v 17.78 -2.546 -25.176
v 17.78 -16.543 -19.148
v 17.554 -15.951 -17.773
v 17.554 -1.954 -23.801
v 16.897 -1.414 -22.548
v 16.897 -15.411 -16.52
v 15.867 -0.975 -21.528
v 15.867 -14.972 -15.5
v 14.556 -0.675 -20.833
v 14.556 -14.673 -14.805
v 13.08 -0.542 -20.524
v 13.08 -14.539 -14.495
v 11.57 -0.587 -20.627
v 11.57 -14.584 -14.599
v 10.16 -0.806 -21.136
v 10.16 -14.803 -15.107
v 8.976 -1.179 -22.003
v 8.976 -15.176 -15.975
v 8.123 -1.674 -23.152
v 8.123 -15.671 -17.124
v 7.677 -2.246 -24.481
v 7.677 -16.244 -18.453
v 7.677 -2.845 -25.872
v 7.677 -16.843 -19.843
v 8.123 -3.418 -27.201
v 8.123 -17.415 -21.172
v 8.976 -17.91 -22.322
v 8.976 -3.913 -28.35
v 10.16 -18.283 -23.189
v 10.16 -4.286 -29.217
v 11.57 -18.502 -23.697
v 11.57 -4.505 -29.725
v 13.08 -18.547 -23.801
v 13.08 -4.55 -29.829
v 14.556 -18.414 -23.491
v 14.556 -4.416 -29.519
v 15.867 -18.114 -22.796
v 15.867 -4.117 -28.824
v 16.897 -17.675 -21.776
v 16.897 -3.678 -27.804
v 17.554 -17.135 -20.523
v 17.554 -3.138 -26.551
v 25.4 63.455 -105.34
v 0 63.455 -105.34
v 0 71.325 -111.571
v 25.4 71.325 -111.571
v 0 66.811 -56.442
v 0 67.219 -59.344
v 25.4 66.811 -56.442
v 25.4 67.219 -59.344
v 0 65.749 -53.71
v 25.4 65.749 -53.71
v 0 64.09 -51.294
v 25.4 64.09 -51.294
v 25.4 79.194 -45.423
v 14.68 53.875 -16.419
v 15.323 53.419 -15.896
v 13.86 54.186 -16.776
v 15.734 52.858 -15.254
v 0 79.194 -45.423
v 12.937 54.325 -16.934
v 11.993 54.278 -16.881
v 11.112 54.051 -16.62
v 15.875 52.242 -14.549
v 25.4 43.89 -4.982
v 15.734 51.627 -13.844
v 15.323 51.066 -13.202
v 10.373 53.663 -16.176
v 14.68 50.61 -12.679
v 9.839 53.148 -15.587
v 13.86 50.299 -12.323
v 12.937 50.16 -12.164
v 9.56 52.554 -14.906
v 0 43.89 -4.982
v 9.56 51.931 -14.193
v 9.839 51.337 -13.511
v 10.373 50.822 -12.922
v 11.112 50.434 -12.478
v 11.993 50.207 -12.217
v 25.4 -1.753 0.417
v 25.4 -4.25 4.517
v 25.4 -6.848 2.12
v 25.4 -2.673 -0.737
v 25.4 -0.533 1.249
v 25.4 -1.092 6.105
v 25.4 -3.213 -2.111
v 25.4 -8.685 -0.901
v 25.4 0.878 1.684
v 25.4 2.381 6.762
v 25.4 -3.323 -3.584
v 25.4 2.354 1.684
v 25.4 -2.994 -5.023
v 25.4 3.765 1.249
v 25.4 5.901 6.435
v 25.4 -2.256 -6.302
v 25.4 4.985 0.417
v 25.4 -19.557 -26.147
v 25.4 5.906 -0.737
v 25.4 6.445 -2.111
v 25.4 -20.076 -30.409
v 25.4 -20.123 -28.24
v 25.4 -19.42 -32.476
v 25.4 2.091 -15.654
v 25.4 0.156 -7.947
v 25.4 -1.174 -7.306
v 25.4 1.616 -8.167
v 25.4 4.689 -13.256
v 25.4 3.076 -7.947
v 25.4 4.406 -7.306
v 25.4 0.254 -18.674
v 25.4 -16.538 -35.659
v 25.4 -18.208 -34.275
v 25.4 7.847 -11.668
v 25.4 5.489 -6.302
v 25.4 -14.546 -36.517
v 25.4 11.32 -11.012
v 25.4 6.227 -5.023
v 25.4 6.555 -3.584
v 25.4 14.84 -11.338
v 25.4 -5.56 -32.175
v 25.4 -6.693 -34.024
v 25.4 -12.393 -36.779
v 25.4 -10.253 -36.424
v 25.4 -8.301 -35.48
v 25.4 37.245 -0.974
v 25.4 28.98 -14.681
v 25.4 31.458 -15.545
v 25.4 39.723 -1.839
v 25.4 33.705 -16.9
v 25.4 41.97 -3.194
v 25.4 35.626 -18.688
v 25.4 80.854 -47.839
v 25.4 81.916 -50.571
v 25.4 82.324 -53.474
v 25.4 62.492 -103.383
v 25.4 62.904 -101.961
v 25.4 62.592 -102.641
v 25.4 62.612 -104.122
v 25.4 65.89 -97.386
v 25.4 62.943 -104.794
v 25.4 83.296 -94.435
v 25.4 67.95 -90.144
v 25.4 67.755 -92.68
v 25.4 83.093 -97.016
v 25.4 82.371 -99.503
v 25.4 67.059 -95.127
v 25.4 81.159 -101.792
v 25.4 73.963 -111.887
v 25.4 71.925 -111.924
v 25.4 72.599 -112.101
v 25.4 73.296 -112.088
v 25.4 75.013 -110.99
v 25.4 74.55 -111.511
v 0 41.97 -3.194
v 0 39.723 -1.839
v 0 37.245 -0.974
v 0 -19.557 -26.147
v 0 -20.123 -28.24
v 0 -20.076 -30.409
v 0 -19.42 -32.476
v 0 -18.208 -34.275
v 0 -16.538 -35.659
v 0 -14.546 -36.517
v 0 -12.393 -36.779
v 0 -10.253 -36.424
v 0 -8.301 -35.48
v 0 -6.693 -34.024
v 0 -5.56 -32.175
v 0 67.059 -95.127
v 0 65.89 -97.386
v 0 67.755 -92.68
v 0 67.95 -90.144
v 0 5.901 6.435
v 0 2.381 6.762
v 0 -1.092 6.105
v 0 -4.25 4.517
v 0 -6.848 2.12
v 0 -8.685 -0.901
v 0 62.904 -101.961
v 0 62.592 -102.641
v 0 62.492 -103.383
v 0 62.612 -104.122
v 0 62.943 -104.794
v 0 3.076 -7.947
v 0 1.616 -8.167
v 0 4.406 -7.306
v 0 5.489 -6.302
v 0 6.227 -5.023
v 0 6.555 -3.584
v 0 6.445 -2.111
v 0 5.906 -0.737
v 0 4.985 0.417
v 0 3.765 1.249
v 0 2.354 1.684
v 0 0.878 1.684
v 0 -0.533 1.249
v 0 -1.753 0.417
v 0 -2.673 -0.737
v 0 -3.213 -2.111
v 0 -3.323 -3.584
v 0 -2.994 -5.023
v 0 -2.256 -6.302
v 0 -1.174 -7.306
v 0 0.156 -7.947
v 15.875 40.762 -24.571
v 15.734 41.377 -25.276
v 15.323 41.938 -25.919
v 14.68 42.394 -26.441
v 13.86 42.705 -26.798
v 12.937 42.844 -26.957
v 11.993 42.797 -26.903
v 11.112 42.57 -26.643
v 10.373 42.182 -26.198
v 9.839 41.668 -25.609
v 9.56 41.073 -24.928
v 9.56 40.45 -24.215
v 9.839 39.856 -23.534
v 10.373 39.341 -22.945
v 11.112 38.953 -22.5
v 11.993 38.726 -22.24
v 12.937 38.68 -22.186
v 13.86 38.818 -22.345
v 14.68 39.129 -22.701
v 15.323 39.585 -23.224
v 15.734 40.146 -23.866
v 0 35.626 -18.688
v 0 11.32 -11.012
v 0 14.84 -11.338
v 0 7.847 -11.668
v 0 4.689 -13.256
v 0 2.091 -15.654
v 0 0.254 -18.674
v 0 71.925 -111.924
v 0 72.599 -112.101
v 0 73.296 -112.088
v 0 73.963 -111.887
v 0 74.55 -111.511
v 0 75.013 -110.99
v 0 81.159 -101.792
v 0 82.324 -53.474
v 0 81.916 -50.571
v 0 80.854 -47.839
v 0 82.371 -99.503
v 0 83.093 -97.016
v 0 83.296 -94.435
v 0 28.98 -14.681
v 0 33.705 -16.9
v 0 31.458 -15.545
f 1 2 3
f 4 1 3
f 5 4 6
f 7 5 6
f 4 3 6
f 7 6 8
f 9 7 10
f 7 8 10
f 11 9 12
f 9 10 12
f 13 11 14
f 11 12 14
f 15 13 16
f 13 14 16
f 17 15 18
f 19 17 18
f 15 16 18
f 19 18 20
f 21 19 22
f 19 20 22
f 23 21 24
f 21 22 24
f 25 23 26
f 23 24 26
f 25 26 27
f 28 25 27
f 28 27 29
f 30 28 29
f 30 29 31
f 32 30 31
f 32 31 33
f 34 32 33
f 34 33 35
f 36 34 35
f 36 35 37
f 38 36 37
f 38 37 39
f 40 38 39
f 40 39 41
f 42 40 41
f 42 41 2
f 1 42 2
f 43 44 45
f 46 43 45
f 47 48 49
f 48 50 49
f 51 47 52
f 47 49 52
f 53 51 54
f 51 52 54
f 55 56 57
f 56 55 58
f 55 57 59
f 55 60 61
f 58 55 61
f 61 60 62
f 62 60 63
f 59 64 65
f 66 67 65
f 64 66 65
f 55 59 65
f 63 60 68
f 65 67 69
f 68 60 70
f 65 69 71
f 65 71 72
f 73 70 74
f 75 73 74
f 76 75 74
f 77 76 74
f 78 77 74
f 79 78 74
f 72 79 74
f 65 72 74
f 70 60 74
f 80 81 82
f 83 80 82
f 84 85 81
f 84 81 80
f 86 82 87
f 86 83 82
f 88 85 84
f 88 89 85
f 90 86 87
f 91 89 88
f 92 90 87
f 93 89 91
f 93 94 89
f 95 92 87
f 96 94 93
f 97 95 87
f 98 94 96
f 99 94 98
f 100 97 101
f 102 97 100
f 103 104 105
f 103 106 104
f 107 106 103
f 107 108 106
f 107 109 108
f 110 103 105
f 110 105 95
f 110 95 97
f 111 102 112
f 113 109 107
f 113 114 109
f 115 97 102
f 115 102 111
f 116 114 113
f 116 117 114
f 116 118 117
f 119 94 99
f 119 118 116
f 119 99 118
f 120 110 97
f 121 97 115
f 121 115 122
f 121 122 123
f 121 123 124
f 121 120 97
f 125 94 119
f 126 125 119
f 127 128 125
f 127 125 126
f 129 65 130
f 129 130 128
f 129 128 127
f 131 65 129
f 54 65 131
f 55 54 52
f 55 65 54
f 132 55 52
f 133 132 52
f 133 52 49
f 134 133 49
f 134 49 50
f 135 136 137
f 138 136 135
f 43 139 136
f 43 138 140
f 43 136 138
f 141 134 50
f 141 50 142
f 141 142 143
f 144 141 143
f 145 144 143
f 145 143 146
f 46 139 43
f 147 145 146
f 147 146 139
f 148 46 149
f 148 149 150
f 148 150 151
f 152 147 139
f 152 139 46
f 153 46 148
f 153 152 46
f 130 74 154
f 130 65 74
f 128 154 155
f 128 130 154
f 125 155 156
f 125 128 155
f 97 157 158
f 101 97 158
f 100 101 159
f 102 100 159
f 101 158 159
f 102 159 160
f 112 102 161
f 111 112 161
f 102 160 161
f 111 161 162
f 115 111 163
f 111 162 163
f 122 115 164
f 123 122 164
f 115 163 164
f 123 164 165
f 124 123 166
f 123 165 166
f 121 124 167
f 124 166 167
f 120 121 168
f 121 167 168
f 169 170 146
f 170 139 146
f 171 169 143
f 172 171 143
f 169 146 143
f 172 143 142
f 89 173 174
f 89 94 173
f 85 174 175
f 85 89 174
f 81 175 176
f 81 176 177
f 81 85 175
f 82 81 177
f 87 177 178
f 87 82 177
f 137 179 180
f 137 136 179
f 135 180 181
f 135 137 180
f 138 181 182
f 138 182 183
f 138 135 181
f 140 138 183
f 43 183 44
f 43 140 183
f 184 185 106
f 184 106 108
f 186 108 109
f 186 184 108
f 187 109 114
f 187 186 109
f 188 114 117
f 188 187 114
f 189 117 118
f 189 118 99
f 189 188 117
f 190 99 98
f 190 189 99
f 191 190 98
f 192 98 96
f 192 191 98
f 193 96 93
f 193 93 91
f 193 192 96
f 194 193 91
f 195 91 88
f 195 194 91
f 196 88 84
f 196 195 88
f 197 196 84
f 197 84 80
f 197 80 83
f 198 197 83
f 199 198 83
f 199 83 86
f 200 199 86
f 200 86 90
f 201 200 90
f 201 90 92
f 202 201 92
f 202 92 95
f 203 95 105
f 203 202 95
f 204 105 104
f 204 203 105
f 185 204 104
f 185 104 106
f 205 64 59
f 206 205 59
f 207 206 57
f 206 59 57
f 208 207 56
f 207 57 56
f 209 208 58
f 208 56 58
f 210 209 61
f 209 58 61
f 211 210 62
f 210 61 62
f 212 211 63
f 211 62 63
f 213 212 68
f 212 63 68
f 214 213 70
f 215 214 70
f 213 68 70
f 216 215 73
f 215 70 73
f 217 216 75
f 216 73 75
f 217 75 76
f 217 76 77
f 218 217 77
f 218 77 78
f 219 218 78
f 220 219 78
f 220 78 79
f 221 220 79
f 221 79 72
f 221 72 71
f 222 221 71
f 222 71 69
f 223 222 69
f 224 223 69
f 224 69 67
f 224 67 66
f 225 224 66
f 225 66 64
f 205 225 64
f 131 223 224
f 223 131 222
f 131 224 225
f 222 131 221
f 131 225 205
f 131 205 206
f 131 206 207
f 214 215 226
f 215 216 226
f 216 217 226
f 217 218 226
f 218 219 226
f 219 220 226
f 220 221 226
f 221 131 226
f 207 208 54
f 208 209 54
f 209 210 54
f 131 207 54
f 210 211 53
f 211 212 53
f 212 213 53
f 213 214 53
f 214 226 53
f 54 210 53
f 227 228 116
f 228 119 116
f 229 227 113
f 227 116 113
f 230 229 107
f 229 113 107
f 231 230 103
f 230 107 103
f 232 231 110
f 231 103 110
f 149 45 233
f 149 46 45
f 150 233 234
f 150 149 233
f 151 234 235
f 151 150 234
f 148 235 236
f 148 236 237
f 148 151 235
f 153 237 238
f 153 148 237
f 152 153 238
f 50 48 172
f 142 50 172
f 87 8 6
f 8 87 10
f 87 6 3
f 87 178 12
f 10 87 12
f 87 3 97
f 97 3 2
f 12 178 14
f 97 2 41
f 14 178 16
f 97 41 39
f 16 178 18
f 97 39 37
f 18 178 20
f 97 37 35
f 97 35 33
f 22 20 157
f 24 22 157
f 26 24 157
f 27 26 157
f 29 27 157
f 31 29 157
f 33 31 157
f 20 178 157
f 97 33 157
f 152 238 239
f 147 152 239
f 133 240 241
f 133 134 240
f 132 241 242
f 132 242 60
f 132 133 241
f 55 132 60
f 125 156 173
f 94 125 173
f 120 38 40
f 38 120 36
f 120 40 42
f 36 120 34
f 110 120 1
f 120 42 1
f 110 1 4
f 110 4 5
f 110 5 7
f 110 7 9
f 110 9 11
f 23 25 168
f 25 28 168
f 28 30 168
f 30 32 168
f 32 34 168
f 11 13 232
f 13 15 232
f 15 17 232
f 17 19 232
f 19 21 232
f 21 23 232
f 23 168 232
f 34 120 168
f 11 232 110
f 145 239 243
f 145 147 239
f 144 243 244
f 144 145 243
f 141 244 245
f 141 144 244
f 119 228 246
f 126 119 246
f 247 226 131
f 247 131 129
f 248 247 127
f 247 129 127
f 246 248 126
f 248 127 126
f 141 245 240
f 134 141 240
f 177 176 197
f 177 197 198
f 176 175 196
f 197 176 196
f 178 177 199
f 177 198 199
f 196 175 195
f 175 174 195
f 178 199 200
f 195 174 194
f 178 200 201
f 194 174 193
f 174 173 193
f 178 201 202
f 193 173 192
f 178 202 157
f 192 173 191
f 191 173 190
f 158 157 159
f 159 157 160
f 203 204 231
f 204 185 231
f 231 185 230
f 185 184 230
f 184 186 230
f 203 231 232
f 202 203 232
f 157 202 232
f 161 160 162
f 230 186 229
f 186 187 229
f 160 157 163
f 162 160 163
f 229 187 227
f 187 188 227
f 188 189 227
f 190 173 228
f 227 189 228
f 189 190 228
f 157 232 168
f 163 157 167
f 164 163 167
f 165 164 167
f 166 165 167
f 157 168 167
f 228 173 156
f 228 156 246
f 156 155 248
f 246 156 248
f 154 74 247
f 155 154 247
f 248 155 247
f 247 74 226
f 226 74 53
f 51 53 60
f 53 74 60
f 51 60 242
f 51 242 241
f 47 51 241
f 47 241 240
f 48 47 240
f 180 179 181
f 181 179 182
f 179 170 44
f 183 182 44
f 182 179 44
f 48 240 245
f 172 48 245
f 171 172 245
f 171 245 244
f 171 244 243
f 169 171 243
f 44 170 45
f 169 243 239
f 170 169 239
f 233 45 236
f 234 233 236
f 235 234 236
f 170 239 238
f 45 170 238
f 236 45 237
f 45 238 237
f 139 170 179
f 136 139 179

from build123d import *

# Parameters (mm, degrees)
SKETCH1_R           = 4.953
BOSS_EXTRUDE1_DEPTH = 25.4
FILLET1_R           = 12.7
FILLET2_R           = 2.54
CUT_EXTRUDE3_REACH  = 130.474
SKETCH5_R           = 5.08
CUT_EXTRUDE4_REACH  = 120.723
SKETCH7_R           = 3.175


with BuildPart() as part:
    # Sketch1 → Boss-Extrude1 (new body)
    with BuildSketch(Plane(origin=(0, 0, 0), x_dir=(0, 0, -1), z_dir=(1, 0, 0))):
        with BuildLine():
            Line((103.901886641, 61.637766497), (113.279686218, 73.483555297))
            Line((113.279686218, 73.483555297), (98.451355982, 83.391276702))
            Line((98.451355982, 83.391276702), (48.882530567, 82.21455605))
            Line((48.882530567, 82.21455605), (1.911791408, 41.210560809))
            Line((1.911791408, 41.210560809), (-8.886551045, -4.469459574))
            Line((-8.886551045, -4.469459574), (26.146598357, -19.557154557))
            ThreePointArc((26.146598357, -19.557154557), (36.159220082, -15.57265883), (32.174724356, -5.560037105))
            Line((32.174724356, -5.560037105), (8.886551045, 4.469459574))
            Line((8.886551045, 4.469459574), (15.618065001, 32.945653592))
            Line((15.618065001, 32.945653592), (54.753455571, 67.109633069))
            Line((54.753455571, 67.109633069), (94.084630156, 68.043320825))
            Line((94.084630156, 68.043320825), (103.901886641, 61.637766497))
        make_face()
        with Locations((3.213640173, 1.616289015)):
            Circle(SKETCH1_R, mode=Mode.SUBTRACT)
    extrude(amount=BOSS_EXTRUDE1_DEPTH)

    # Fillet1
    fillet1_edges = [part.edges().sort_by_distance(p)[0] for p in [
        (12.7, 68.043320825, -94.084630156),
        (12.7, 67.109633069, -54.753455571),
        (12.7, 32.945653592, -15.618065001),
        (12.7, 4.469459574, -8.886551045),
        (12.7, -4.469459574, 8.886551045),
        (12.7, 41.210560809, -1.911791408),
        (12.7, 82.21455605, -48.882530567),
        (12.7, 83.391276702, -98.451355982),
    ]]
    fillet(fillet1_edges, radius=FILLET1_R)

    # Fillet2
    fillet2_edges = [part.edges().sort_by_distance(p)[0] for p in [
        (12.7, 73.483555297, -113.279686218),
        (12.7, 61.637766497, -103.901886641),
    ]]
    fillet(fillet2_edges, radius=FILLET2_R)

    # Sketch5 → Cut-Extrude3 (cut, up to next)
    with BuildSketch(Plane(origin=(0, -6.998558726, 3.014062999), x_dir=(1, 0, 0), z_dir=(0, -0.918446027, 0.395546325)), mode=Mode.PRIVATE) as cut_extrude3_sk1:
        with Locations((12.7, -24.13)):
            Circle(SKETCH5_R)
    cut_extrude3_tool1 = extrude(cut_extrude3_sk1.sketch, amount=-CUT_EXTRUDE3_REACH, mode=Mode.PRIVATE) & part.part
    add(cut_extrude3_tool1.solids().sort_by_distance((12.7, -16.543092, -19.14804))[0], mode=Mode.SUBTRACT)

    # Sketch7 → Cut-Extrude4 (cut, up to next)
    with BuildSketch(Plane(origin=(0, 22.440379915, 19.589754126), x_dir=(1, 0, 0), z_dir=(0, 0.753334468, 0.657637574)), mode=Mode.PRIVATE) as cut_extrude4_sk1:
        with Locations((12.7, 45.316910599)):
            Circle(SKETCH7_R)
    cut_extrude4_tool1 = extrude(cut_extrude4_sk1.sketch, amount=-CUT_EXTRUDE4_REACH, mode=Mode.PRIVATE) & part.part
    add(cut_extrude4_tool1.solids().sort_by_distance((12.7, 52.242483, -14.549037))[0], mode=Mode.SUBTRACT)


solid = part.part
